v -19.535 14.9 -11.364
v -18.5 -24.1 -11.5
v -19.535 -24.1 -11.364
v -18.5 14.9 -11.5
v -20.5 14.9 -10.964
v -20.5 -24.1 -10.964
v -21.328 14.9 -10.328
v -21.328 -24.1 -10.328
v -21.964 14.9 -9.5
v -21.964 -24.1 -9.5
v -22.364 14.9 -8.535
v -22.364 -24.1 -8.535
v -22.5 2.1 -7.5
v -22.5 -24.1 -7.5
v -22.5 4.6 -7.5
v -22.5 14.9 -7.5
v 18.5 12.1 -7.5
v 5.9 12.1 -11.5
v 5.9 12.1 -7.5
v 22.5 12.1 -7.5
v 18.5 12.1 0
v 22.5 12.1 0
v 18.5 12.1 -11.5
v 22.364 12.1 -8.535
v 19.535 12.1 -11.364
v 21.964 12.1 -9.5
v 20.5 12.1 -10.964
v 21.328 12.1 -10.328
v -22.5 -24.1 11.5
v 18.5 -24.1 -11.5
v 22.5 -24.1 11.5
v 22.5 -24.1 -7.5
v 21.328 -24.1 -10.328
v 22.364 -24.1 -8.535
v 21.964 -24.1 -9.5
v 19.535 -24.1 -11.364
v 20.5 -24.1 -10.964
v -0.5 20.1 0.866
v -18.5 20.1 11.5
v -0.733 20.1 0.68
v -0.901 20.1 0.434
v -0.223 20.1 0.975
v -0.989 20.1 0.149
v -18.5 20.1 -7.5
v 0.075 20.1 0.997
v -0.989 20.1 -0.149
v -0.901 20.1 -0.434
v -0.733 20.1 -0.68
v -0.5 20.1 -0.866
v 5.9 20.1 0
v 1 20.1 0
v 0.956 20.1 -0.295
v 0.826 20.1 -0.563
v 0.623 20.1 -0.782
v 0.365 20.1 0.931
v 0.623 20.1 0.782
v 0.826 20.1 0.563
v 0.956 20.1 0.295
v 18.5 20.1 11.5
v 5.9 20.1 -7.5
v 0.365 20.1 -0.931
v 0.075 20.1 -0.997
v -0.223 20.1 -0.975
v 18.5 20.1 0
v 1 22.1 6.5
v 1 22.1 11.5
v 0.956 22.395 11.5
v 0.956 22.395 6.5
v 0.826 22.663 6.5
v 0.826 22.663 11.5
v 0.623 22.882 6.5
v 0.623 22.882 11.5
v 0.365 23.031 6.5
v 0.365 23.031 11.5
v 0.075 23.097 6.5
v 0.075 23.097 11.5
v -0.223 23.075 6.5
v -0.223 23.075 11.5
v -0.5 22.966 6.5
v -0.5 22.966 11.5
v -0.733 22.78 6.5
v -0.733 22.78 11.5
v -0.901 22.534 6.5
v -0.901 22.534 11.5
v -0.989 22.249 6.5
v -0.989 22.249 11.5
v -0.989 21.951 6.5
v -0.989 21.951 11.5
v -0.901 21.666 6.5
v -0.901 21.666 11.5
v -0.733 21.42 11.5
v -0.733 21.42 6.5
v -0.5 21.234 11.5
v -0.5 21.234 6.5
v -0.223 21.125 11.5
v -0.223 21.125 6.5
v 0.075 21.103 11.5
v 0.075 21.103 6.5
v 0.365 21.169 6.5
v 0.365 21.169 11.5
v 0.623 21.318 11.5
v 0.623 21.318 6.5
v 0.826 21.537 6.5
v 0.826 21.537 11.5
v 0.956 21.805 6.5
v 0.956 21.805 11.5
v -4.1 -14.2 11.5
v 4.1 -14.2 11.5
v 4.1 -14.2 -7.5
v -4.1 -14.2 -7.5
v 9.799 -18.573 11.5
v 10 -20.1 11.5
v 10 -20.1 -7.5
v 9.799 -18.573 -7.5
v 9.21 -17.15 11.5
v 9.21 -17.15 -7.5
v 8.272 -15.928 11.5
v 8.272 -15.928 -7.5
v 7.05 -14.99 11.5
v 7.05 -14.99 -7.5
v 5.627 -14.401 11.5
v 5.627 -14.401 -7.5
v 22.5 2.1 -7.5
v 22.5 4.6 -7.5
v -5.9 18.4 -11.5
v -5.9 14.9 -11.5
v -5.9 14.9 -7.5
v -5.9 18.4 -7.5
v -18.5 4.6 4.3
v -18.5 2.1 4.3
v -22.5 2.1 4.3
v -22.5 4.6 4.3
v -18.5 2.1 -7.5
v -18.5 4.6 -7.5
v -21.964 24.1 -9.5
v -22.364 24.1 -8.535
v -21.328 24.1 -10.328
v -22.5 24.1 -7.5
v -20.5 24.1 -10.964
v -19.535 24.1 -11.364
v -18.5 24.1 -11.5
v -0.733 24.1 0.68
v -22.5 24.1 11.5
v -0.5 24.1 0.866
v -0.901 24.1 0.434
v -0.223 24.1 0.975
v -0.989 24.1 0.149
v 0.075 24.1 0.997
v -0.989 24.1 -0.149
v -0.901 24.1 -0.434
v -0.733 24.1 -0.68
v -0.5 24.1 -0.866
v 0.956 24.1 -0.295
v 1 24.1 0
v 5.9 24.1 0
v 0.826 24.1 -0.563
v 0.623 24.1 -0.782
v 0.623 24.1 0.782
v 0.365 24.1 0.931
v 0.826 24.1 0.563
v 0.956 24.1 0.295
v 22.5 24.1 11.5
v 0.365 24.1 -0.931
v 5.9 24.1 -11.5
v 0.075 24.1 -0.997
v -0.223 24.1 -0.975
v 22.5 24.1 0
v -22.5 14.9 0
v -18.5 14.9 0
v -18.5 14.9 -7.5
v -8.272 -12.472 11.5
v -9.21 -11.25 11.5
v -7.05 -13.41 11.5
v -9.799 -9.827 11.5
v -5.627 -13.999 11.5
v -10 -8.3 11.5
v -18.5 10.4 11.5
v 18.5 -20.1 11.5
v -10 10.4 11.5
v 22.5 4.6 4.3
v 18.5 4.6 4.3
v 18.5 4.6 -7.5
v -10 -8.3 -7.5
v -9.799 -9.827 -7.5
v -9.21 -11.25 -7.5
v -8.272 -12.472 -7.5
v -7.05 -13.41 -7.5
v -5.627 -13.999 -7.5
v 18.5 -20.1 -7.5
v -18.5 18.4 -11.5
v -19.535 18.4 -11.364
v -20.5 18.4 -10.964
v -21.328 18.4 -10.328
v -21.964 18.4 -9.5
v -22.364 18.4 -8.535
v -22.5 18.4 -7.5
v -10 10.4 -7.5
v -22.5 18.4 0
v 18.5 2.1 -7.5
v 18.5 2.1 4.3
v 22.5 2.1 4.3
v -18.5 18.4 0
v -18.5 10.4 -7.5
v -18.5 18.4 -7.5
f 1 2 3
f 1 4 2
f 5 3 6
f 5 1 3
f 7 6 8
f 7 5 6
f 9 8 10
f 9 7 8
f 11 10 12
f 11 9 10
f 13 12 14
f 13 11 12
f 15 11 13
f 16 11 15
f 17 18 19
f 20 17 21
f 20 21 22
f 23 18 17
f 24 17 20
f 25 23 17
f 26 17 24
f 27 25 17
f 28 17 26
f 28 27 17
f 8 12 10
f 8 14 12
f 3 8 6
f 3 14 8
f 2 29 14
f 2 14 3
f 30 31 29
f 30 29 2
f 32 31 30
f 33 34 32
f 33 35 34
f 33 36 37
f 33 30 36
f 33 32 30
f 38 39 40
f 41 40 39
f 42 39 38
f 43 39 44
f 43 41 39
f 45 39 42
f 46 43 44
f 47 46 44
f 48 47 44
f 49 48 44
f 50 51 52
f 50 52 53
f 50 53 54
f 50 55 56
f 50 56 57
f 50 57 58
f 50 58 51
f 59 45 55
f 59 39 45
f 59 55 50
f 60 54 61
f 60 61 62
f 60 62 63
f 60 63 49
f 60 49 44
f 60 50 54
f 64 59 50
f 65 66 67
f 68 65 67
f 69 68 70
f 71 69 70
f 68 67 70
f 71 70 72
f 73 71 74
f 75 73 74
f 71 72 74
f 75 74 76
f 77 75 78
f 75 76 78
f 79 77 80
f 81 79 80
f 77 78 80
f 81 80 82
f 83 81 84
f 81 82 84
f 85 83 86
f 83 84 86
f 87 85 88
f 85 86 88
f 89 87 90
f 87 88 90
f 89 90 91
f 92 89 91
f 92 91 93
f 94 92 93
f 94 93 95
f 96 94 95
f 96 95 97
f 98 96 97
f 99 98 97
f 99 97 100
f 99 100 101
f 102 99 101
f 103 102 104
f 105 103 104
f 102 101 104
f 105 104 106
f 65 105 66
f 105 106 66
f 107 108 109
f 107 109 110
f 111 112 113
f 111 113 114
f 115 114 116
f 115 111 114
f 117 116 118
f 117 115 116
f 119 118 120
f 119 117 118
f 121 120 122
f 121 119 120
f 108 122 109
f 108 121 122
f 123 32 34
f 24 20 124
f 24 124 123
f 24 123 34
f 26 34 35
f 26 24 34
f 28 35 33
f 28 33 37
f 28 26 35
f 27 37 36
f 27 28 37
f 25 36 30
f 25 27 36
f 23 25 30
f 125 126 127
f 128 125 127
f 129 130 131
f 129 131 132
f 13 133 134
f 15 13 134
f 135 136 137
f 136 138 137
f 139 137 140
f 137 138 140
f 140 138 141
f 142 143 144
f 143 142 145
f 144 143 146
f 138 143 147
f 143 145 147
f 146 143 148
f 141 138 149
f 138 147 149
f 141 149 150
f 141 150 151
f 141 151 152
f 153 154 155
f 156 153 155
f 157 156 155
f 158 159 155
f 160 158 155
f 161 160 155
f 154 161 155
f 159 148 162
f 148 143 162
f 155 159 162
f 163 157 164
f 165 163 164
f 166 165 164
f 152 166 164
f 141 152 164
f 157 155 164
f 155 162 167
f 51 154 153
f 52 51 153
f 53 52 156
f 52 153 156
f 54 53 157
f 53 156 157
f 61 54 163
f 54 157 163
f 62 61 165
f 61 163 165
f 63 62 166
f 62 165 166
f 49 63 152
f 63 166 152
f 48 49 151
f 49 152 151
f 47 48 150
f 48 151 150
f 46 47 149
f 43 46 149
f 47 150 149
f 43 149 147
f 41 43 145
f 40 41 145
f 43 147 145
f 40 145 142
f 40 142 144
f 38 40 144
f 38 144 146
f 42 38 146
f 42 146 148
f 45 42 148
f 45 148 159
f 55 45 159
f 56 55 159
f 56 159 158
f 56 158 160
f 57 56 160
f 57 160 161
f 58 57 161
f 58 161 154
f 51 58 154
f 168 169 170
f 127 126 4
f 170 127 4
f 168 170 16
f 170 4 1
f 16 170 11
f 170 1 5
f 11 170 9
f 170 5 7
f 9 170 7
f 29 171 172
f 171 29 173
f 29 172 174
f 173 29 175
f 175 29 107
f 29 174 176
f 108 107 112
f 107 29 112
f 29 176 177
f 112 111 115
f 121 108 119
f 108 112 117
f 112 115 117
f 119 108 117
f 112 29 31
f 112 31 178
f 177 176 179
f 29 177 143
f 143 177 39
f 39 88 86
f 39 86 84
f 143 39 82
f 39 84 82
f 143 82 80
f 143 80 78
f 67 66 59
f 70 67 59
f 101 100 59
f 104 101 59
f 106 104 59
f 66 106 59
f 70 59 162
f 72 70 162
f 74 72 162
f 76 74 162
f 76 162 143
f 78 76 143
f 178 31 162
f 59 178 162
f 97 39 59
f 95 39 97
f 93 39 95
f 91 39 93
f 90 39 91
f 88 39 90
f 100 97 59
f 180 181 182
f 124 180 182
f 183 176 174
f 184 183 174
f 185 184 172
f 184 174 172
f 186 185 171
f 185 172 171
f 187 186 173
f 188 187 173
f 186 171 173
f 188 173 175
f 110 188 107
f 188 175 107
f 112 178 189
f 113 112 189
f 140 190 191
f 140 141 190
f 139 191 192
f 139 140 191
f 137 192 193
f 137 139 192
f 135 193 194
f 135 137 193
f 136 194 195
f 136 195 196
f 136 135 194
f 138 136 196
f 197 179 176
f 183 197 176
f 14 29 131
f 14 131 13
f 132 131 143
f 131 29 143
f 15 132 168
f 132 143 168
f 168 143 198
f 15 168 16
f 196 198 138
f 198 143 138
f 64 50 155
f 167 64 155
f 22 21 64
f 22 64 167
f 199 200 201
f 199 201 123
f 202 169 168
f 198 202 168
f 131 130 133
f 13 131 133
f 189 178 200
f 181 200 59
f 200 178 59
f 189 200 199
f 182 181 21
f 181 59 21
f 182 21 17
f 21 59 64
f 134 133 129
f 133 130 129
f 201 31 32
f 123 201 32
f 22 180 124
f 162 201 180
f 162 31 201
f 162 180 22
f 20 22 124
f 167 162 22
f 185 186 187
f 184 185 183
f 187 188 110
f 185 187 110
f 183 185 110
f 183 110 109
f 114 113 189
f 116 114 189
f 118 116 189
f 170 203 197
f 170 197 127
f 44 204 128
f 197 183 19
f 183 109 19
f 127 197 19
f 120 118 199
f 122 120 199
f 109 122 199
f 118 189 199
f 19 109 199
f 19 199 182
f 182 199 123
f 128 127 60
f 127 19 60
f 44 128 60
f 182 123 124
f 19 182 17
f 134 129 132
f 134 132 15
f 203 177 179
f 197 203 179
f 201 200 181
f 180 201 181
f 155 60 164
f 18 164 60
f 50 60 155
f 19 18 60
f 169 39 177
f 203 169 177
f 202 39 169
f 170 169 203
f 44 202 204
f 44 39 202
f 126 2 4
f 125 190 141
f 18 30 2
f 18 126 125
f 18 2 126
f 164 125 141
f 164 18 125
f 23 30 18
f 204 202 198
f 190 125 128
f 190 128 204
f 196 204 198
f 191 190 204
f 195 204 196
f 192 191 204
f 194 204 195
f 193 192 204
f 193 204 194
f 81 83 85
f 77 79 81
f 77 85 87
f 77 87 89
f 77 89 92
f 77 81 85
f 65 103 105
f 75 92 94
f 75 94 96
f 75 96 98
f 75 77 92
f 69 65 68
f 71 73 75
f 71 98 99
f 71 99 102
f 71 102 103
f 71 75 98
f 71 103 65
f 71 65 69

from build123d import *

# Parameters (mm, degrees)
CROQUIS1_W                        = 23
CROQUIS1_H                        = 48.2
SALIENTE_EXTRUIR1_DEPTH           = 22.5
VACIADO1_T                        = -4
CORTAR_EXTRUIR1_START             = -9.2
CORTAR_EXTRUIR1_DEPTH             = 3.5
REDONDEO1_R                       = 4
CROQUIS3_W                        = 11.8
CROQUIS3_H                        = 2.5
CORTAR_EXTRUIR2_DEPTH             = 23.5
CORTAR_EXTRUIR2_DEPTH_BACK        = 23.5
CORTAR_EXTRUIR3_REACH             = 50.2
CROQUIS4_R                        = 1
CORTAR_EXTRUIR3_DIRECTION_2_DEPTH = 1
CROQUIS5_R                        = 1
CORTAR_EXTRUIR4_DEPTH             = 5
SALIENTE_EXTRUIR2_REACH           = 25
CORTAR_EXTRUIR5_START             = -12
CORTAR_EXTRUIR5_DEPTH             = 13
SALIENTE_EXTRUIR3_REACH           = 25


with BuildPart() as part:
    # Croquis1 → Saliente-Extruir1 (new body, symmetric)
    with BuildSketch(Plane(origin=(0, 0, 0), x_dir=(0, 0, -1), z_dir=(1, 0, 0))):
        Rectangle(CROQUIS1_W, CROQUIS1_H)
    extrude(amount=SALIENTE_EXTRUIR1_DEPTH, both=True)

    # Vaciado1
    vaciado1_openings = [part.faces().sort_by_distance(p)[0] for p in [
        (0, 0, 11.5),
    ]]
    offset(amount=VACIADO1_T, openings=vaciado1_openings, kind=Kind.INTERSECTION)

    # Croquis2 → Cortar-Extruir1 (cut)
    with BuildSketch(Plane(origin=(0, 24.1, 0), x_dir=(1, 0, 0), z_dir=(0, 1, 0)).offset(CORTAR_EXTRUIR1_START)):
        Polygon((-22.5, 11.5), (-5.9, 11.5), (-5.9, 7.5), (-18.5, 7.5), (-18.5, 0), (-22.5, 0), align=None)
        Polygon((18.5, 0), (22.5, 0), (22.5, 11.5), (5.9, 11.5), (5.9, 7.5), (18.5, 7.5), align=None)
    extrude(amount=CORTAR_EXTRUIR1_DEPTH, mode=Mode.SUBTRACT)

    # Redondeo1
    redondeo1_edges = [part.edges().sort_by_distance(p)[0] for p in [
        (-22.5, 21.25, -11.5),
        (22.5, 21.25, -11.5),
        (22.5, -4.6, -11.5),
        (-22.5, -4.6, -11.5),
    ]]
    fillet(redondeo1_edges, radius=REDONDEO1_R)

    # Croquis3 → Cortar-Extruir2 (cut, two sides)
    with BuildSketch(Plane(origin=(0, 0, 0), x_dir=(0, 0, -1), z_dir=(1, 0, 0))) as cortar_extruir2_sk:
        with Locations((1.6, 3.35)):
            Rectangle(CROQUIS3_W, CROQUIS3_H)
    extrude(amount=CORTAR_EXTRUIR2_DEPTH, mode=Mode.SUBTRACT)
    extrude(cortar_extruir2_sk.sketch, amount=-CORTAR_EXTRUIR2_DEPTH_BACK, mode=Mode.SUBTRACT)

    # Croquis4 → Cortar-Extruir3 (cut, up to next)
    with BuildSketch(Plane(origin=(0, 24.1, 0), x_dir=(1, 0, 0), z_dir=(0, 1, 0)), mode=Mode.PRIVATE) as cortar_extruir3_sk1:
        Circle(CROQUIS4_R)
    cortar_extruir3_tool1 = extrude(cortar_extruir3_sk1.sketch, amount=-CORTAR_EXTRUIR3_REACH, mode=Mode.PRIVATE) & part.part
    add(cortar_extruir3_tool1.solids().sort_by_distance((0, 24.1, 0))[0], mode=Mode.SUBTRACT)

    # Croquis4 → Cortar-Extruir3 direction 2 (cut)
    with BuildSketch(Plane(origin=(0, 24.1, 0), x_dir=(1, 0, 0), z_dir=(0, 1, 0))):
        Circle(CROQUIS4_R)
    extrude(amount=CORTAR_EXTRUIR3_DIRECTION_2_DEPTH, mode=Mode.SUBTRACT)

    # Croquis5 → Cortar-Extruir4 (cut)
    with BuildSketch(Plane.XY.offset(11.5)):
        with Locations((0, 22.1)):
            Circle(CROQUIS5_R)
    extrude(amount=-CORTAR_EXTRUIR4_DEPTH, mode=Mode.SUBTRACT)

    # Croquis6 → Saliente-Extruir2 (add, up to next)
    with BuildSketch(Plane.XY.offset(11.5), mode=Mode.PRIVATE) as saliente_extruir2_sk1:
        with BuildLine():
            Line((-10, -20.1), (10, -20.1))
            ThreePointArc((10, -20.1), (8.271930009, -15.928069991), (4.1, -14.2))
            Line((4.1, -14.2), (-4.1, -14.2))
            ThreePointArc((-4.1, -14.2), (-8.271930009, -15.928069991), (-10, -20.1))
        make_face()
    saliente_extruir2_tool1 = extrude(saliente_extruir2_sk1.sketch, amount=-SALIENTE_EXTRUIR2_REACH, mode=Mode.PRIVATE) - part.part
    add(saliente_extruir2_tool1.solids().sort_by_distance((0, -17.386611, 11.5))[0])

    # Croquis7 → Cortar-Extruir5 (cut, through all)
    with BuildSketch(Plane(origin=(0, 24.1, 0), x_dir=(1, 0, 0), z_dir=(0, 1, 0)).offset(CORTAR_EXTRUIR5_START)):
        with BuildLine():
            Line((5.9, 7.5), (5.9, 0))
            Line((5.9, 0), (18.5, 0))
            Line((18.5, 0), (22.5, 0))
            Line((22.5, 0), (22.5, 7.5))
            ThreePointArc((22.5, 7.5), (21.328427125, 10.328427125), (18.5, 11.5))
            Line((18.5, 11.5), (5.9, 11.5))
            Line((5.9, 11.5), (5.9, 7.5))
        make_face()
    extrude(amount=CORTAR_EXTRUIR5_DEPTH, mode=Mode.SUBTRACT)

    # Croquis8 → Saliente-Extruir3 (add, up to next)
    with BuildSketch(Plane.XY.offset(11.5), mode=Mode.PRIVATE) as saliente_extruir3_sk1:
        with BuildLine():
            Line((-18.5, -20.1), (-18.5, 10.4))
            Line((-18.5, 10.4), (-10, 10.4))
            Line((-10, 10.4), (-10, -8.3))
            ThreePointArc((-10, -8.3), (-8.271930009, -12.471930009), (-4.1, -14.2))
            ThreePointArc((-4.1, -14.2), (-8.271930009, -15.928069991), (-10, -20.1))
            Line((-10, -20.1), (-18.5, -20.1))
        make_face()
    saliente_extruir3_tool1 = extrude(saliente_extruir3_sk1.sketch, amount=-SALIENTE_EXTRUIR3_REACH, mode=Mode.PRIVATE) - part.part
    add(saliente_extruir3_tool1.solids().sort_by_distance((-13.946608, -5.359479, 11.5))[0])


solid = part.part
